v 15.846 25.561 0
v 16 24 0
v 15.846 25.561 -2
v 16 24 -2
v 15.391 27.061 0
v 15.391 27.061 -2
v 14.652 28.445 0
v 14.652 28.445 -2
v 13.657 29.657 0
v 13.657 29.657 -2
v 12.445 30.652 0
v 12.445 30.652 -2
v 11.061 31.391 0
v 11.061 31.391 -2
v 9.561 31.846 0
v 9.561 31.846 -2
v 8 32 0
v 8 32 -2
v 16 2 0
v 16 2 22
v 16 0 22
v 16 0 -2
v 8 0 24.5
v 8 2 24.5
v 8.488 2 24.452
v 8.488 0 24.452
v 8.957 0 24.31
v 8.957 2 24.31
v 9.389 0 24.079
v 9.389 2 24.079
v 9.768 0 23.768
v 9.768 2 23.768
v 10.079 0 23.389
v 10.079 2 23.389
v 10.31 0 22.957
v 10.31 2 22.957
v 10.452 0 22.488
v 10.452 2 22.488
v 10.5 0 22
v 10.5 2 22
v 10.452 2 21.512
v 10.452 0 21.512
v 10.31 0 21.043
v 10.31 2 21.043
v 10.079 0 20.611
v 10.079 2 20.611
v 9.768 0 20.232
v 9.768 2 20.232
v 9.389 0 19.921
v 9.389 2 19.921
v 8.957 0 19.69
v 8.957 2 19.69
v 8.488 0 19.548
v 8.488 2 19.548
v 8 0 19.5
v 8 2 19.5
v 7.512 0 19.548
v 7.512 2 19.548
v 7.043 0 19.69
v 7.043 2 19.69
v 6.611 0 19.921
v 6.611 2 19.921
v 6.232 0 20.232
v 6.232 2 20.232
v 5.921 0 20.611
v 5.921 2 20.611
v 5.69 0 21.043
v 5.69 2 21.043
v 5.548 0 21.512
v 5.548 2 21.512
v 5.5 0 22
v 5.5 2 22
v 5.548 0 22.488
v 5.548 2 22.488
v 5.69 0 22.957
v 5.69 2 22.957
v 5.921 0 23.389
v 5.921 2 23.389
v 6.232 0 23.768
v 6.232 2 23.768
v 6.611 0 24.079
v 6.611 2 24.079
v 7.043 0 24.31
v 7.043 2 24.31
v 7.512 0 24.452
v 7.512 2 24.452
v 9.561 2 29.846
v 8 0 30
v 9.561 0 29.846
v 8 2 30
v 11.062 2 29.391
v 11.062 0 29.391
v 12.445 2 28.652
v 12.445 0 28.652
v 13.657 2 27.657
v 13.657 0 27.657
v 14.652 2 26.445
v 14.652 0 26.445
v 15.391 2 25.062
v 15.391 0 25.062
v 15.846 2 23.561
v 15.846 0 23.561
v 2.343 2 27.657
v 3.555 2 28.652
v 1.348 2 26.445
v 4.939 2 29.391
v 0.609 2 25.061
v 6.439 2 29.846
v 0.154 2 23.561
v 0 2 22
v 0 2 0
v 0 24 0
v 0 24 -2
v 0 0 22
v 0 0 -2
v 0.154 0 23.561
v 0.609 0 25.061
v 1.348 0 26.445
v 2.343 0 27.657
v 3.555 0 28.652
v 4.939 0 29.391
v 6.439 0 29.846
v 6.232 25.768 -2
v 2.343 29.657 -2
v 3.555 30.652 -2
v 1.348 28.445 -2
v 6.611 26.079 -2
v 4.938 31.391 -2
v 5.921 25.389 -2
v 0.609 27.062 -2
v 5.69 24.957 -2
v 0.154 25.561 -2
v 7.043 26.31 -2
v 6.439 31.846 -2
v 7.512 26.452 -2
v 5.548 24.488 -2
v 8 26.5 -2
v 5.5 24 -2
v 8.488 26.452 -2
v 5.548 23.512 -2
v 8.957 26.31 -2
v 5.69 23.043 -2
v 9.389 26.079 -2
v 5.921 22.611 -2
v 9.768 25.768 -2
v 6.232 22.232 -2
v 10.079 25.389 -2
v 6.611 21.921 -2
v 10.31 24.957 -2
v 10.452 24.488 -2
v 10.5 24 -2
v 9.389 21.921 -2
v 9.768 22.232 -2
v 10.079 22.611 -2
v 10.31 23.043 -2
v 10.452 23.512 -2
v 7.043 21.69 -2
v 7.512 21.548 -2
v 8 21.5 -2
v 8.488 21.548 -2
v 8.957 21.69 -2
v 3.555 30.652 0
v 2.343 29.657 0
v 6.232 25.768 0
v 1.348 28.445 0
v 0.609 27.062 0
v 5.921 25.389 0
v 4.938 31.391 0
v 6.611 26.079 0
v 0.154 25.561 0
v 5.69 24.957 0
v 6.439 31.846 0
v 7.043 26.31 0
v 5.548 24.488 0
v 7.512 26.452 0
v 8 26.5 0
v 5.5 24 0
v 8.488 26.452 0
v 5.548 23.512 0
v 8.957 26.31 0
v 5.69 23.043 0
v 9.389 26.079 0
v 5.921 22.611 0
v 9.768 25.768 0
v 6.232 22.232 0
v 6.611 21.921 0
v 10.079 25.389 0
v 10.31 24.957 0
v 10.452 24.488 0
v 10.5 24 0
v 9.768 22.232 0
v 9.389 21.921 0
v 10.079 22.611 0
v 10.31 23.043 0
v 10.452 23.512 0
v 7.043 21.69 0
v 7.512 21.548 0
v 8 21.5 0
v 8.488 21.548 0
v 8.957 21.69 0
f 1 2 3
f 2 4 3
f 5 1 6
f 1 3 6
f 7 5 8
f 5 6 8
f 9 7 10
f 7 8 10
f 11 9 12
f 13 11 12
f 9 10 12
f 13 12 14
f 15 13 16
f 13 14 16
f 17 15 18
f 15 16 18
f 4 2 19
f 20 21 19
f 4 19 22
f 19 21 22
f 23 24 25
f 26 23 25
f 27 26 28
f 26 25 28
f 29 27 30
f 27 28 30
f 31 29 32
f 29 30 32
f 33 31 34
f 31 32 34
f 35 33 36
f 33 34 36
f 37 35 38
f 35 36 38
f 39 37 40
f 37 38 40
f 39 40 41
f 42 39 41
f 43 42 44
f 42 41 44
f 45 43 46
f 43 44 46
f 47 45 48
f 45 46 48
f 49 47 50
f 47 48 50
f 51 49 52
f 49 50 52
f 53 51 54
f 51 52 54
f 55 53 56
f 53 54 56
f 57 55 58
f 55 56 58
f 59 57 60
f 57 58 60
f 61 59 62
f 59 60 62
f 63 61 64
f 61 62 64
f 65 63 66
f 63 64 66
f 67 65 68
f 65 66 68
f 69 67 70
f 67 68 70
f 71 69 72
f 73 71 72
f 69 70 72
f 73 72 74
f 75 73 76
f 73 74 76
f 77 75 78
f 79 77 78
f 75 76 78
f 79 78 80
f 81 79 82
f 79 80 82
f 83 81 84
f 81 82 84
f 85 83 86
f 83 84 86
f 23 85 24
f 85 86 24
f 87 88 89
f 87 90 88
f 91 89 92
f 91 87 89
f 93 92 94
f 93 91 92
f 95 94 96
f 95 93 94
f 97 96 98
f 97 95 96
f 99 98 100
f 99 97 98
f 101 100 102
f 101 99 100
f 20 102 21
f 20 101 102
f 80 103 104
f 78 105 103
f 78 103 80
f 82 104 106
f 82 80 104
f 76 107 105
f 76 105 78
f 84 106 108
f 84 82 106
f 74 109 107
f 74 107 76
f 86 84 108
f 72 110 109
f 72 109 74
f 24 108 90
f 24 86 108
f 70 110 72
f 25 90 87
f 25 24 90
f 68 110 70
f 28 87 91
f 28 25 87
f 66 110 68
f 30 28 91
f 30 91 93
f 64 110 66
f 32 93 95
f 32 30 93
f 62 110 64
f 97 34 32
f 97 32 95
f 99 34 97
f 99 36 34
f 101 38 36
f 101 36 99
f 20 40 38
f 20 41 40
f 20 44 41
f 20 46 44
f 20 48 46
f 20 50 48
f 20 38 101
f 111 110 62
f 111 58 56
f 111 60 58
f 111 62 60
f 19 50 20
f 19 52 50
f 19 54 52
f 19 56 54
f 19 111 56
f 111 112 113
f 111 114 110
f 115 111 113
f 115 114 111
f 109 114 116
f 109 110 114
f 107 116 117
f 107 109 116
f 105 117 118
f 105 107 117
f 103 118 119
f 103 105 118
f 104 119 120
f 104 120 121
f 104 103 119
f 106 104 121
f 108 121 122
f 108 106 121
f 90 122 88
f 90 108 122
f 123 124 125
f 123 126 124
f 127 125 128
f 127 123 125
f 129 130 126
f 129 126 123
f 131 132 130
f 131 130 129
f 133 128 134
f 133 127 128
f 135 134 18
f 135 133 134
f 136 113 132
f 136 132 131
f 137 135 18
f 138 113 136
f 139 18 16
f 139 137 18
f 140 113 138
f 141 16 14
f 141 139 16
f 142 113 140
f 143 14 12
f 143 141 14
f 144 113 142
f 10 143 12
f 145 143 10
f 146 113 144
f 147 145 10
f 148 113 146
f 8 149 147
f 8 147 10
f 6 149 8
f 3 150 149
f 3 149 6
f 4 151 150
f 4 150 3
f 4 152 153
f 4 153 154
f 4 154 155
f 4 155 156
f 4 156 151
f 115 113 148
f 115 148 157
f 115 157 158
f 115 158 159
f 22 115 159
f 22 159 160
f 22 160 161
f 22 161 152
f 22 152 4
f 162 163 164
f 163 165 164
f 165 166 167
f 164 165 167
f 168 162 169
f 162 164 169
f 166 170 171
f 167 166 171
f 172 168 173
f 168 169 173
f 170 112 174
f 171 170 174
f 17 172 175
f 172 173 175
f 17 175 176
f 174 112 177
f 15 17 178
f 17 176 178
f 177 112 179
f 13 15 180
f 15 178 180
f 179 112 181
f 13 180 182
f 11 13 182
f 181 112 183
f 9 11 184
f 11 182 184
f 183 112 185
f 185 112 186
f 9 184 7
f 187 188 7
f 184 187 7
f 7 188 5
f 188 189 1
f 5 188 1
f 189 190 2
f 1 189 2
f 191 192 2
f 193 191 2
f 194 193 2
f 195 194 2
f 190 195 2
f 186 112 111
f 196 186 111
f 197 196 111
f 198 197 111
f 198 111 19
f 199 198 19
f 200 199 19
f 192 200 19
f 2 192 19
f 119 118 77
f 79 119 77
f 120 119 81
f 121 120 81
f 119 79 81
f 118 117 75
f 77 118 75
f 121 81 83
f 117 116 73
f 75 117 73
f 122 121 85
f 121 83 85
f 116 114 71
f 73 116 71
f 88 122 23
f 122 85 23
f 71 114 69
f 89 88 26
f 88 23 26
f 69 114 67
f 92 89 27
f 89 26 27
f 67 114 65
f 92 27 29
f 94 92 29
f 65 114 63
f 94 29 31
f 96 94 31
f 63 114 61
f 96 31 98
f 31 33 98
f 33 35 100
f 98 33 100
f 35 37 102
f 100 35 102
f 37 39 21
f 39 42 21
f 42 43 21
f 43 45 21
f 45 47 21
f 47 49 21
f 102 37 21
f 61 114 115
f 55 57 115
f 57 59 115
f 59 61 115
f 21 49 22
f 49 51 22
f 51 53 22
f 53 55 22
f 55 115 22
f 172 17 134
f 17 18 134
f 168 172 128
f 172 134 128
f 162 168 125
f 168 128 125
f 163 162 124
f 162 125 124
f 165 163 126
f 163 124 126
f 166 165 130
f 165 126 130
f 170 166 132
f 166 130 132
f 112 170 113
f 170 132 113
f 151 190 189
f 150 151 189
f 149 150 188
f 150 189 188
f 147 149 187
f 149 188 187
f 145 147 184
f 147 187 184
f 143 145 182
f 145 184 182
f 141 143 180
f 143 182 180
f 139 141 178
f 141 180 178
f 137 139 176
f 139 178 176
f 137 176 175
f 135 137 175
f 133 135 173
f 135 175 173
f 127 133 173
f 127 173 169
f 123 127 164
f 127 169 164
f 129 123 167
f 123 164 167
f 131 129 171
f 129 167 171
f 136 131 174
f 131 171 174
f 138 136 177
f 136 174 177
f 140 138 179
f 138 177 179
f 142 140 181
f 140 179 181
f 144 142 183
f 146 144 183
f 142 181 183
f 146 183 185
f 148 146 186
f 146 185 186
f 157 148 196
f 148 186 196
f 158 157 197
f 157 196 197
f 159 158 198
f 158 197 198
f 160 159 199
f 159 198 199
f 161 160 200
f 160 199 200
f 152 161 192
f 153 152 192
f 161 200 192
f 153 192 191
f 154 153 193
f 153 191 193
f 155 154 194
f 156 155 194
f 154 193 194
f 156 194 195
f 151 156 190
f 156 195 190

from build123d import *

# Parameters (mm, degrees)
SKETCH_1_W          = 16
SKETCH_1_H          = 2
EXTRUDE_1_DEPTH     = 30
FILLET_1_R          = 8
FILLET_2_R          = 8
SKETCH_2_W          = 16
SKETCH_2_H          = 2
EXTRUDE_2_DEPTH     = 32
FILLET_3_R          = 8
FILLET_4_R          = 8
SKETCH_4_R          = 2.5
CUT_EXTRUDE_2_DEPTH = 2
SKETCH_3_R          = 2.5
CUT_EXTRUDE_3_DEPTH = 2


with BuildPart() as part:
    # 草图1 → 凸台-拉伸1 (new body)
    with BuildSketch(Plane.XY):
        with Locations((8, 1)):
            Rectangle(SKETCH_1_W, SKETCH_1_H)
    extrude(amount=EXTRUDE_1_DEPTH)

    # 圆角1
    fillet_1_edges = [part.edges().sort_by_distance(p)[0] for p in [
        (0, 1, 30),
    ]]
    fillet(fillet_1_edges, radius=FILLET_1_R)

    # 圆角2
    fillet_2_edges = [part.edges().sort_by_distance(p)[0] for p in [
        (16, 1, 30),
    ]]
    fillet(fillet_2_edges, radius=FILLET_2_R - 0.0001)  # a hair under: the kernel refuses the full size

    # 草图2 → 凸台-拉伸2 (add)
    with BuildSketch(Plane(origin=(0, 0, 0), x_dir=(1, 0, 0), z_dir=(0, 1, 0))):
        with Locations((8, 1)):
            Rectangle(SKETCH_2_W, SKETCH_2_H)
    extrude(amount=EXTRUDE_2_DEPTH)

    # 圆角3
    fillet_3_edges = [part.edges().sort_by_distance(p)[0] for p in [
        (16, 32, -1),
    ]]
    fillet(fillet_3_edges, radius=FILLET_3_R)

    # 圆角4
    fillet_4_edges = [part.edges().sort_by_distance(p)[0] for p in [
        (0, 32, -1),
    ]]
    fillet(fillet_4_edges, radius=FILLET_4_R - 0.0001)  # a hair under: the kernel refuses the full size

    # 草图4 → 切除-拉伸2 (cut)
    with BuildSketch(Plane(origin=(0, 2, 0), x_dir=(1, 0, 0), z_dir=(0, 1, 0))):
        with Locations(Location((8, -22, 0), (0, 0, 270))):
            Circle(SKETCH_4_R)
    extrude(amount=-CUT_EXTRUDE_2_DEPTH, mode=Mode.SUBTRACT)

    # 草图3 → 切除-拉伸3 (cut)
    with BuildSketch(Plane.XY):
        with Locations((8, 24)):
            Circle(SKETCH_3_R)
        with Locations((8, 40)):
            Circle(SKETCH_3_R)
    extrude(amount=-CUT_EXTRUDE_3_DEPTH, mode=Mode.SUBTRACT)


solid = part.part
